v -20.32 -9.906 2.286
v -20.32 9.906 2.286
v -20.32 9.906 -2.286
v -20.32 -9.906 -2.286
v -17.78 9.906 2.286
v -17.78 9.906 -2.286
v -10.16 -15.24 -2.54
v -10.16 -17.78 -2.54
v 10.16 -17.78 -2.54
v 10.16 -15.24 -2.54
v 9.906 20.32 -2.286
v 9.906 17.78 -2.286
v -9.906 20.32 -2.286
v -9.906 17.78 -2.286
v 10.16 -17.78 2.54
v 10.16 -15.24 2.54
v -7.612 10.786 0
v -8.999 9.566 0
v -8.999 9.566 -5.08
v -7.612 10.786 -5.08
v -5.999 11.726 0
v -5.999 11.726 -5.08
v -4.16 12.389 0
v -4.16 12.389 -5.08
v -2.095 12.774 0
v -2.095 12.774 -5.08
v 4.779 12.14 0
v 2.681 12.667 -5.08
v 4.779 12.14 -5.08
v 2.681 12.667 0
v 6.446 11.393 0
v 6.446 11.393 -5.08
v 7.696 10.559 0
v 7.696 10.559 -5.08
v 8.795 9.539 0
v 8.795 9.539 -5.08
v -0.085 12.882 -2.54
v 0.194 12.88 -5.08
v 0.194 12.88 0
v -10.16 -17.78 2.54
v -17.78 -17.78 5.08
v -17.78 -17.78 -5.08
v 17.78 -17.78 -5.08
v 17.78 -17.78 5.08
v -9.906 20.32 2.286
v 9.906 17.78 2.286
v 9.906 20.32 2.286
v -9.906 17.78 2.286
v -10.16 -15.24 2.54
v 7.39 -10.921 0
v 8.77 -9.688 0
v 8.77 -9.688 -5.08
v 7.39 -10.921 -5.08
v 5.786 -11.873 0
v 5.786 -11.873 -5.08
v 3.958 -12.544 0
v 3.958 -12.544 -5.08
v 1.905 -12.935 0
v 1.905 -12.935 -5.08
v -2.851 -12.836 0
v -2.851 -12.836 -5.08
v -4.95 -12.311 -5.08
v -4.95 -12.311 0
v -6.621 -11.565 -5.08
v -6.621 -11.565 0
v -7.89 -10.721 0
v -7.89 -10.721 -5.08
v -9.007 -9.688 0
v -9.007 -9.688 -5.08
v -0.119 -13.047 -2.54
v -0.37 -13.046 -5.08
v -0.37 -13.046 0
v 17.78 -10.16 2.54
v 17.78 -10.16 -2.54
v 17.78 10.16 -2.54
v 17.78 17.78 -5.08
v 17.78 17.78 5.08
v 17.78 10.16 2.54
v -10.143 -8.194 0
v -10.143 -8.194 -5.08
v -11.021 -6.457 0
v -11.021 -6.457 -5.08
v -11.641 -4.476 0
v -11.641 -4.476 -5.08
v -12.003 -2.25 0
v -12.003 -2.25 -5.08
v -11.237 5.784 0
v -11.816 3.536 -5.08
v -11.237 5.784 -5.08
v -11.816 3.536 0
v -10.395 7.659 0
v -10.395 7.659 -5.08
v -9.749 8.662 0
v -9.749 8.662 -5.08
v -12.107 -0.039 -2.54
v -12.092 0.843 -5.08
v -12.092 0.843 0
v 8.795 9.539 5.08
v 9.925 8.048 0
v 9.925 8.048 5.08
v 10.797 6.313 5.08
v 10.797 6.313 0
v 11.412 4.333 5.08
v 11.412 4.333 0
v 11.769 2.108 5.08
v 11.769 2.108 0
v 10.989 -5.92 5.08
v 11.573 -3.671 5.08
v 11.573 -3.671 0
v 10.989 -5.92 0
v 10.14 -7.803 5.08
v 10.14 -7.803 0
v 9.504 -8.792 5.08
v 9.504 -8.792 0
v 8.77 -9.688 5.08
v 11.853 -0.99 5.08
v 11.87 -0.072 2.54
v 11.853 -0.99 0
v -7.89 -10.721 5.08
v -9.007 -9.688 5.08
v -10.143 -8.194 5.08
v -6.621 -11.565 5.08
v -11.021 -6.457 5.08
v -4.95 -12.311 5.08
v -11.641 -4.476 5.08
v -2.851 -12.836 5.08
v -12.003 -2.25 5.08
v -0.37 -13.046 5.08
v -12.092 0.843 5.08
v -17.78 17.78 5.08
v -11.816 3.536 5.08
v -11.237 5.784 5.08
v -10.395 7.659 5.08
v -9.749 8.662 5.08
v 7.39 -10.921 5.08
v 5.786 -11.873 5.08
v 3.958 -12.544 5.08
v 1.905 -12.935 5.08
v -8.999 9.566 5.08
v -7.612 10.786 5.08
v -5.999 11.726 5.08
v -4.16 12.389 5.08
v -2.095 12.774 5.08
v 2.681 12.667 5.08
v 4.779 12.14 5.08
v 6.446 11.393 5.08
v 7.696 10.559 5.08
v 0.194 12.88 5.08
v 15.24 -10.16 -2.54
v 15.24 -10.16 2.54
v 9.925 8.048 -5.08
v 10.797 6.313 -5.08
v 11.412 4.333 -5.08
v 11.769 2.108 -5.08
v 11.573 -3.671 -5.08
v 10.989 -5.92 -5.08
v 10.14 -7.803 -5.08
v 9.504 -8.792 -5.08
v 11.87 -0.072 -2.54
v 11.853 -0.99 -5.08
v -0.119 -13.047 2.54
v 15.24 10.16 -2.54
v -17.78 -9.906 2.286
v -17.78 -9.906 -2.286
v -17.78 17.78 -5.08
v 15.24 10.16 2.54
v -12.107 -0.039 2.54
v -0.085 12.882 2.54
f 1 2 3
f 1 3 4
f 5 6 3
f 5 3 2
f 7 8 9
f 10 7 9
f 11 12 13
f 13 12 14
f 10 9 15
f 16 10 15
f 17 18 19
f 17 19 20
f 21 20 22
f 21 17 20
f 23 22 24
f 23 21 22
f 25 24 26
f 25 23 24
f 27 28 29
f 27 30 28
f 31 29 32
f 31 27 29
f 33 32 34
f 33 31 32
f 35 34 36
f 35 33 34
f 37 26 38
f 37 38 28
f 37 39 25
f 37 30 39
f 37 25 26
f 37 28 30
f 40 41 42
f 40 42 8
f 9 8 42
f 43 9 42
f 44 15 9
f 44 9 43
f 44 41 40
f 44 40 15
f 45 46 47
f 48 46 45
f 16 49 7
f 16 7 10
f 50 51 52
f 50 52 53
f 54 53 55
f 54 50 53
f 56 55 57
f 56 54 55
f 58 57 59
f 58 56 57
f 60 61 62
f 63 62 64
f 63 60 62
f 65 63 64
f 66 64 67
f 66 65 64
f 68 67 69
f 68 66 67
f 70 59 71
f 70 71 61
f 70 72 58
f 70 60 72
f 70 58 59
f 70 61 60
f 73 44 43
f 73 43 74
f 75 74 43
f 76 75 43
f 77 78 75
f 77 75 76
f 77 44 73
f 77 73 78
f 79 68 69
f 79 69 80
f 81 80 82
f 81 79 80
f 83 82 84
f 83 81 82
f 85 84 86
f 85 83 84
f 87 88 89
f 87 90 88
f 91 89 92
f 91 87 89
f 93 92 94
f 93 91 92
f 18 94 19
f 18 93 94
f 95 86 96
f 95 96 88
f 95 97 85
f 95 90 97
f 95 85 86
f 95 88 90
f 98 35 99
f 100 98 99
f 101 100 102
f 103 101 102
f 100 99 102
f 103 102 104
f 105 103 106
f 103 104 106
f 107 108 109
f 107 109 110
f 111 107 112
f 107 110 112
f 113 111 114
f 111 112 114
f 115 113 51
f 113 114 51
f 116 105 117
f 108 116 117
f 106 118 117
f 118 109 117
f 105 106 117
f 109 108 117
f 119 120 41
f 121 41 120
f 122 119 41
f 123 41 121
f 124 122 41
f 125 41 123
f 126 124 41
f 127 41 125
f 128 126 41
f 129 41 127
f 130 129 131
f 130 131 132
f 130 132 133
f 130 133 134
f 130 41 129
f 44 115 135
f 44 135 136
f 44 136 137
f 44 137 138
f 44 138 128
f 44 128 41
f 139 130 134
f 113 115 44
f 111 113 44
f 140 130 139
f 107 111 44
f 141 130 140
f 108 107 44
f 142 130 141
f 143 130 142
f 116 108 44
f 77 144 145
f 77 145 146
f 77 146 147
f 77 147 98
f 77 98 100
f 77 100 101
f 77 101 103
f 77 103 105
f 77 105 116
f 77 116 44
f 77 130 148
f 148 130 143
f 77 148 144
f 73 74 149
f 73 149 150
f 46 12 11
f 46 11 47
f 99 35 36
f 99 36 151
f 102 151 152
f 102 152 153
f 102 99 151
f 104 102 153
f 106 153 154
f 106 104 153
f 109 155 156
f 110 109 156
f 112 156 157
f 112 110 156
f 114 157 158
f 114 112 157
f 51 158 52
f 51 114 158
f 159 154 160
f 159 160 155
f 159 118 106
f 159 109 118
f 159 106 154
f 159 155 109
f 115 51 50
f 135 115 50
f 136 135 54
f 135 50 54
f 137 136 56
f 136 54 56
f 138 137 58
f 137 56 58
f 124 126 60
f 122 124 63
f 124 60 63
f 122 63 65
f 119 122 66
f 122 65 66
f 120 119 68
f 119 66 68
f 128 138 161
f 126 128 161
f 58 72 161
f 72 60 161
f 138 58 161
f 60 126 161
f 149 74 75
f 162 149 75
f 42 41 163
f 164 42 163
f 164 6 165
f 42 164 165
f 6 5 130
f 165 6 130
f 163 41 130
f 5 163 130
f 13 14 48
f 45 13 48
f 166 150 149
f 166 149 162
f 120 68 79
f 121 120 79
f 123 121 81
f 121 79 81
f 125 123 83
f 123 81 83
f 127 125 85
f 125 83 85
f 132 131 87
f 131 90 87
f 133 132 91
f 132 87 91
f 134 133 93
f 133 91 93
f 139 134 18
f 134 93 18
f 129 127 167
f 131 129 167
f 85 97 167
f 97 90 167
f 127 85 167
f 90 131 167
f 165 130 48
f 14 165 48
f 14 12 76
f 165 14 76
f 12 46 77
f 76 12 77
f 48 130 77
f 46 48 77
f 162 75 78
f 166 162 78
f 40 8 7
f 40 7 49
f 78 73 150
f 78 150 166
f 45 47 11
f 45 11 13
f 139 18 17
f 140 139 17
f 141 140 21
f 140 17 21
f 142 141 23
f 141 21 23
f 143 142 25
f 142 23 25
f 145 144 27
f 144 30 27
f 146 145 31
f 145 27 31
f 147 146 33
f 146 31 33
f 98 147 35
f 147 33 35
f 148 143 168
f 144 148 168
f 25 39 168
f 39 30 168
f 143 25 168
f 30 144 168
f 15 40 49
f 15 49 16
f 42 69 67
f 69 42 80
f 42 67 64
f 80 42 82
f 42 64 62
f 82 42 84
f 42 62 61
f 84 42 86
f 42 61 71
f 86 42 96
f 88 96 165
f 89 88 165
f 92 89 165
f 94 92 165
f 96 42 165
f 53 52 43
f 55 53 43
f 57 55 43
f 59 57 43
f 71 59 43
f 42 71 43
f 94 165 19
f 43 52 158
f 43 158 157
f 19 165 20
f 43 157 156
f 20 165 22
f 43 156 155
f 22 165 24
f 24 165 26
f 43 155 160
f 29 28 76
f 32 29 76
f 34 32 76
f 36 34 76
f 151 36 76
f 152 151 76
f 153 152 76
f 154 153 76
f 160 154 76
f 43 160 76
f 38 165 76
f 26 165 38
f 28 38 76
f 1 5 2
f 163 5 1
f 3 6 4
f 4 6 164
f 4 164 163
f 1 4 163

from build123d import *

# Parameters (mm, degrees)
F0_W     = 35.56
F0_H     = 35.56
F1_DEPTH = 5.08
F2_W     = 19.812
F2_H     = 4.572
F3_DEPTH = 2.54
F4_W     = 19.812
F4_H     = 4.572
F5_DEPTH = 2.54
F6_W     = 20.32
F6_H     = 5.08
F7_DEPTH = 2.54
F8_W     = 20.32
F8_H     = 5.08
F9_DEPTH = 2.54


with BuildPart() as f1:
    # F0 (on Top) → F1 (new body, symmetric)
    with BuildSketch(Plane.XY):
        Rectangle(F0_W, F0_H)
        with BuildLine():
            add(Edge.make_bspline(
                [(8.7946397569, 9.5387803819), (11.8704210069, 6.1956597222), (11.8704210069, -0.0716579861)],
                knots=[0, 0, 0, 1, 1, 1], degree=2))
            add(Edge.make_bspline(
                [(11.8704210069, -0.0716579861), (11.8704210069, -6.3279513889), (8.7698350694, -9.6876085069)],
                knots=[0, 0, 0, 1, 1, 1], degree=2))
            add(Edge.make_bspline(
                [(8.7698350694, -9.6876085069), (5.6692491319, -13.047265625), (-0.1185112847, -13.047265625)],
                knots=[0, 0, 0, 1, 1, 1], degree=2))
            add(Edge.make_bspline(
                [(-0.1185112847, -13.047265625), (-5.9062717014, -13.047265625), (-9.0068576389, -9.6876085069)],
                knots=[0, 0, 0, 1, 1, 1], degree=2))
            add(Edge.make_bspline(
                [(-9.0068576389, -9.6876085069), (-12.1074435764, -6.3279513889), (-12.1074435764, -0.0385850694)],
                knots=[0, 0, 0, 1, 1, 1], degree=2))
            add(Edge.make_bspline(
                [(-12.1074435764, -0.0385850694), (-12.1074435764, 6.25078125), (-8.9985894097, 9.5663411458)],
                knots=[0, 0, 0, 1, 1, 1], degree=2))
            add(Edge.make_bspline(
                [(-8.9985894097, 9.5663411458), (-5.8897352431, 12.8819010417), (-0.0854383681, 12.8819010417)],
                knots=[0, 0, 0, 1, 1, 1], degree=2))
            add(Edge.make_bspline(
                [(-0.0854383681, 12.8819010417), (5.7188585069, 12.8819010417), (8.7946397569, 9.5387803819)],
                knots=[0, 0, 0, 1, 1, 1], degree=2))
        make_face(mode=Mode.SUBTRACT)
    extrude(amount=F1_DEPTH, both=True)

    # F2 (on face) → F3 (join)
    with BuildSketch(Plane(origin=(0, 17.78, 0), x_dir=(-1, 0, 0), z_dir=(0, 1, 0))):
        Rectangle(F2_W, F2_H)
    extrude(amount=F3_DEPTH)

    # F4 (on face) → F5 (join)
    with BuildSketch(Plane(origin=(-17.78, 0, 0), x_dir=(0, -1, 0), z_dir=(-1, 0, 0))):
        Rectangle(F4_W, F4_H)
    extrude(amount=F5_DEPTH)

    # F6 (on face) → F7 (cut)
    with BuildSketch(Plane.XZ.offset(17.78)):
        Rectangle(F6_W, F6_H)
    extrude(amount=-F7_DEPTH, mode=Mode.SUBTRACT)

    # F8 (on face) → F9 (cut)
    with BuildSketch(Plane.YZ.offset(17.78)):
        Rectangle(F8_W, F8_H)
    extrude(amount=-F9_DEPTH, mode=Mode.SUBTRACT)


solid = f1.part
